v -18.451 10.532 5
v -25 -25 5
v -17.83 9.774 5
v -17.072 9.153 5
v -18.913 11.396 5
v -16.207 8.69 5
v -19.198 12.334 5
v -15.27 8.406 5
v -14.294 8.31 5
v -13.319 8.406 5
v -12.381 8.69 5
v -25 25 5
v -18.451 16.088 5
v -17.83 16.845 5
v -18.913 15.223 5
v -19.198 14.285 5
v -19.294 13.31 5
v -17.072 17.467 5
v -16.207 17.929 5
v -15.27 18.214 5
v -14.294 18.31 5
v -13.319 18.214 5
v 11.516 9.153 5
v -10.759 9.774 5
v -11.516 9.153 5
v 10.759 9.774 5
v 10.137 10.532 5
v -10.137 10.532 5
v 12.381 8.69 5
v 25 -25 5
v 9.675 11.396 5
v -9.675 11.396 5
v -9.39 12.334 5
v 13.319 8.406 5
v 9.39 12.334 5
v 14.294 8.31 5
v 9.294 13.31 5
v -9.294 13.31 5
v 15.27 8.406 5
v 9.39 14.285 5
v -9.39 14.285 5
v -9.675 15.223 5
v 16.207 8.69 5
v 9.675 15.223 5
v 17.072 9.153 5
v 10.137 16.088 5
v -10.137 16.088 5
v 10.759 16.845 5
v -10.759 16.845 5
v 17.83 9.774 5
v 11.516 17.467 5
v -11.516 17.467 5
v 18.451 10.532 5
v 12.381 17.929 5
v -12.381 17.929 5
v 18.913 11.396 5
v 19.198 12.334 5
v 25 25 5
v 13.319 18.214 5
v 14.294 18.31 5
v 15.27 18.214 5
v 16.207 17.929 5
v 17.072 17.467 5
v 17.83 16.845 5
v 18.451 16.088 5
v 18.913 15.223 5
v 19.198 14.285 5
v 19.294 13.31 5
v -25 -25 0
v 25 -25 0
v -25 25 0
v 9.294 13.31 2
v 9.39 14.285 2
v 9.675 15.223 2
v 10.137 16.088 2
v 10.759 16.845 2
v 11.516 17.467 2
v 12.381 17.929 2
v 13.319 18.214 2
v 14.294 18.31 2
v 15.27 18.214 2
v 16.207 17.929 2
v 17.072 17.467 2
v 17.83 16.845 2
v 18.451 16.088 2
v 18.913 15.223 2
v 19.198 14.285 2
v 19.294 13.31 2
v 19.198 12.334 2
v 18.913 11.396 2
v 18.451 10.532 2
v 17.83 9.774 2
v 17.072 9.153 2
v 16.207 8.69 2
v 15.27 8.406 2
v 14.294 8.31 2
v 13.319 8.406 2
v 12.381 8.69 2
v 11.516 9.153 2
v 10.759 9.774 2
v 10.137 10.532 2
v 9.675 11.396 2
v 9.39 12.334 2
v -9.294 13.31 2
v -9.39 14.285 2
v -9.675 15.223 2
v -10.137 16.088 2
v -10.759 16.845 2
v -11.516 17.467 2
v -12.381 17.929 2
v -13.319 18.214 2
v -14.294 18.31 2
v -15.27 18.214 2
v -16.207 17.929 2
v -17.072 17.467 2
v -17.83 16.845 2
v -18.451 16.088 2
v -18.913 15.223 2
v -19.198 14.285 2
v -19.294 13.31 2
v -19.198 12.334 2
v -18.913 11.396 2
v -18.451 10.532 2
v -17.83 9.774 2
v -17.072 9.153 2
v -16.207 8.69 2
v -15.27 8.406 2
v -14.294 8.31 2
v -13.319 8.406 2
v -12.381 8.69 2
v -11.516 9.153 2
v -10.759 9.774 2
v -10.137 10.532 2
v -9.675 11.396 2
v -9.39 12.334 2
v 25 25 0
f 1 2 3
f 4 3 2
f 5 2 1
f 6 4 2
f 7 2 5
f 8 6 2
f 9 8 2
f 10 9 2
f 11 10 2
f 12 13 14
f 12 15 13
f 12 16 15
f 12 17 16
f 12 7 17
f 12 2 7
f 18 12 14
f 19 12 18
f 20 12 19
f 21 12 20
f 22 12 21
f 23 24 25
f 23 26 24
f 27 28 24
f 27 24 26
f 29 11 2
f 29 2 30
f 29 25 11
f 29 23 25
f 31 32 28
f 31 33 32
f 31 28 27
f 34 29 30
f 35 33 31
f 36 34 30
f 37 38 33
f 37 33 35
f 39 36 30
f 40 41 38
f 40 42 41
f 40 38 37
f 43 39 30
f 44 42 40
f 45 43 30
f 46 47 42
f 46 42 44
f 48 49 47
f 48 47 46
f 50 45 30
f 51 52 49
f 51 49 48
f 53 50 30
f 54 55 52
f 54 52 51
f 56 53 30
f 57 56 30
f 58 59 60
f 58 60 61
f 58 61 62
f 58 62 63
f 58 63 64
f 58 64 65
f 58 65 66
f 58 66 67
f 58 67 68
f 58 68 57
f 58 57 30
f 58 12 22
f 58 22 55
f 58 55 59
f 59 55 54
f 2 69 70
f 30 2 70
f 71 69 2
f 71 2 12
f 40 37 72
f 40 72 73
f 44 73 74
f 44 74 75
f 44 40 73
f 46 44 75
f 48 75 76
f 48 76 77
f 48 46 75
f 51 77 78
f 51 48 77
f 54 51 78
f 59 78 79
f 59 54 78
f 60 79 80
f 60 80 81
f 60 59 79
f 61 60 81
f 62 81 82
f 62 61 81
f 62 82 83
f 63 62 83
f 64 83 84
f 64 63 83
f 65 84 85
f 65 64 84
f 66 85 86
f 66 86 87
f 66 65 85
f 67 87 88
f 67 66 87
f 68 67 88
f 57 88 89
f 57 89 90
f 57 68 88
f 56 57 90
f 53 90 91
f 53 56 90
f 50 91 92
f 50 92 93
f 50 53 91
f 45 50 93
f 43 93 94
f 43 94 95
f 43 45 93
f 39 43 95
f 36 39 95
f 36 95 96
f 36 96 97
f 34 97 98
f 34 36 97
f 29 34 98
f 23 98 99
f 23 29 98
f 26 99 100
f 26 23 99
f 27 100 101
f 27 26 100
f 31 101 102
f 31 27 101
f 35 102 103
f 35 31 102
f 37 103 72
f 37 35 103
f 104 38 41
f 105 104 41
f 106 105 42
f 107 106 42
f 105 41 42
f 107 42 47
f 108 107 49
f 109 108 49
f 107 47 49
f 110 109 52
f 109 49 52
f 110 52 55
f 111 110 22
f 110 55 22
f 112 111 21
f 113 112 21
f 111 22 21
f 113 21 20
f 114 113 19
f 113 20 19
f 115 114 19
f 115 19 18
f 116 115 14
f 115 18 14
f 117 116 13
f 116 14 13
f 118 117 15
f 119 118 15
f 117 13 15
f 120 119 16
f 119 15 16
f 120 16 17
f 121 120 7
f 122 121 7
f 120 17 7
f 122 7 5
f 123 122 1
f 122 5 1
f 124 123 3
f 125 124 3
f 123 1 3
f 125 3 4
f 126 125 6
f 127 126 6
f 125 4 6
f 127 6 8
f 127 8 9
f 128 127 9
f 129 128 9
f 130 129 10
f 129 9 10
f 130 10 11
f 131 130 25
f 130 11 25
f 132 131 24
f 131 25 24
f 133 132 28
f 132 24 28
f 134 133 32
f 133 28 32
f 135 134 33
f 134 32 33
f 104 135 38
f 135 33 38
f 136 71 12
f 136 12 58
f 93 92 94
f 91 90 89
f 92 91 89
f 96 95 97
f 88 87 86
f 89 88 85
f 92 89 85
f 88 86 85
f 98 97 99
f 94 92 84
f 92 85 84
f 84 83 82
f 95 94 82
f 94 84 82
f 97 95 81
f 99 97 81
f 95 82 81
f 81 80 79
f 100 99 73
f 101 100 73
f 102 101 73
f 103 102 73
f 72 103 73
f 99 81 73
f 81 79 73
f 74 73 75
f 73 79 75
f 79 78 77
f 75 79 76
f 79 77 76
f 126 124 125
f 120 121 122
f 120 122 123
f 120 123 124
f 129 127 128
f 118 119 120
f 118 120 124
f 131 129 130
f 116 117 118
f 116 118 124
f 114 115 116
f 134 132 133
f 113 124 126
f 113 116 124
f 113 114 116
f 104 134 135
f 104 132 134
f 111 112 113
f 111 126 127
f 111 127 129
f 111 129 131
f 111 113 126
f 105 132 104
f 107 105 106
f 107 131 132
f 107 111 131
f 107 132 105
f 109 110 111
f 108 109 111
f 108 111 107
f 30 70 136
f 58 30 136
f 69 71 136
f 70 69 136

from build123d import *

# Parameters (mm, degrees)
SKETCH_W     = 50
SKETCH_H     = 50
PAD_DEPTH    = 5
SKETCH001_R  = 5
POCKET_DEPTH = 3


with BuildPart() as part:
    # Sketch → Pad (new body)
    with BuildSketch(Plane.XY):
        Rectangle(SKETCH_W, SKETCH_H)
    extrude(amount=PAD_DEPTH)

    # Sketch001 (on Face6 of Pad) → Pocket (cut)
    with BuildSketch(Plane.XY.offset(5)):
        with Locations((-14.29406, 13.309855)):
            Circle(SKETCH001_R)
    pocket = extrude(amount=-POCKET_DEPTH, mode=Mode.SUBTRACT)

    # Mirrored: Pocket across Sketch001 V_Axis
    add(pocket.mirror(Plane(origin=(0, 0, 5), x_dir=(0, 0, 1), z_dir=(1, 0, 0))), mode=Mode.SUBTRACT)


solid = part.part
